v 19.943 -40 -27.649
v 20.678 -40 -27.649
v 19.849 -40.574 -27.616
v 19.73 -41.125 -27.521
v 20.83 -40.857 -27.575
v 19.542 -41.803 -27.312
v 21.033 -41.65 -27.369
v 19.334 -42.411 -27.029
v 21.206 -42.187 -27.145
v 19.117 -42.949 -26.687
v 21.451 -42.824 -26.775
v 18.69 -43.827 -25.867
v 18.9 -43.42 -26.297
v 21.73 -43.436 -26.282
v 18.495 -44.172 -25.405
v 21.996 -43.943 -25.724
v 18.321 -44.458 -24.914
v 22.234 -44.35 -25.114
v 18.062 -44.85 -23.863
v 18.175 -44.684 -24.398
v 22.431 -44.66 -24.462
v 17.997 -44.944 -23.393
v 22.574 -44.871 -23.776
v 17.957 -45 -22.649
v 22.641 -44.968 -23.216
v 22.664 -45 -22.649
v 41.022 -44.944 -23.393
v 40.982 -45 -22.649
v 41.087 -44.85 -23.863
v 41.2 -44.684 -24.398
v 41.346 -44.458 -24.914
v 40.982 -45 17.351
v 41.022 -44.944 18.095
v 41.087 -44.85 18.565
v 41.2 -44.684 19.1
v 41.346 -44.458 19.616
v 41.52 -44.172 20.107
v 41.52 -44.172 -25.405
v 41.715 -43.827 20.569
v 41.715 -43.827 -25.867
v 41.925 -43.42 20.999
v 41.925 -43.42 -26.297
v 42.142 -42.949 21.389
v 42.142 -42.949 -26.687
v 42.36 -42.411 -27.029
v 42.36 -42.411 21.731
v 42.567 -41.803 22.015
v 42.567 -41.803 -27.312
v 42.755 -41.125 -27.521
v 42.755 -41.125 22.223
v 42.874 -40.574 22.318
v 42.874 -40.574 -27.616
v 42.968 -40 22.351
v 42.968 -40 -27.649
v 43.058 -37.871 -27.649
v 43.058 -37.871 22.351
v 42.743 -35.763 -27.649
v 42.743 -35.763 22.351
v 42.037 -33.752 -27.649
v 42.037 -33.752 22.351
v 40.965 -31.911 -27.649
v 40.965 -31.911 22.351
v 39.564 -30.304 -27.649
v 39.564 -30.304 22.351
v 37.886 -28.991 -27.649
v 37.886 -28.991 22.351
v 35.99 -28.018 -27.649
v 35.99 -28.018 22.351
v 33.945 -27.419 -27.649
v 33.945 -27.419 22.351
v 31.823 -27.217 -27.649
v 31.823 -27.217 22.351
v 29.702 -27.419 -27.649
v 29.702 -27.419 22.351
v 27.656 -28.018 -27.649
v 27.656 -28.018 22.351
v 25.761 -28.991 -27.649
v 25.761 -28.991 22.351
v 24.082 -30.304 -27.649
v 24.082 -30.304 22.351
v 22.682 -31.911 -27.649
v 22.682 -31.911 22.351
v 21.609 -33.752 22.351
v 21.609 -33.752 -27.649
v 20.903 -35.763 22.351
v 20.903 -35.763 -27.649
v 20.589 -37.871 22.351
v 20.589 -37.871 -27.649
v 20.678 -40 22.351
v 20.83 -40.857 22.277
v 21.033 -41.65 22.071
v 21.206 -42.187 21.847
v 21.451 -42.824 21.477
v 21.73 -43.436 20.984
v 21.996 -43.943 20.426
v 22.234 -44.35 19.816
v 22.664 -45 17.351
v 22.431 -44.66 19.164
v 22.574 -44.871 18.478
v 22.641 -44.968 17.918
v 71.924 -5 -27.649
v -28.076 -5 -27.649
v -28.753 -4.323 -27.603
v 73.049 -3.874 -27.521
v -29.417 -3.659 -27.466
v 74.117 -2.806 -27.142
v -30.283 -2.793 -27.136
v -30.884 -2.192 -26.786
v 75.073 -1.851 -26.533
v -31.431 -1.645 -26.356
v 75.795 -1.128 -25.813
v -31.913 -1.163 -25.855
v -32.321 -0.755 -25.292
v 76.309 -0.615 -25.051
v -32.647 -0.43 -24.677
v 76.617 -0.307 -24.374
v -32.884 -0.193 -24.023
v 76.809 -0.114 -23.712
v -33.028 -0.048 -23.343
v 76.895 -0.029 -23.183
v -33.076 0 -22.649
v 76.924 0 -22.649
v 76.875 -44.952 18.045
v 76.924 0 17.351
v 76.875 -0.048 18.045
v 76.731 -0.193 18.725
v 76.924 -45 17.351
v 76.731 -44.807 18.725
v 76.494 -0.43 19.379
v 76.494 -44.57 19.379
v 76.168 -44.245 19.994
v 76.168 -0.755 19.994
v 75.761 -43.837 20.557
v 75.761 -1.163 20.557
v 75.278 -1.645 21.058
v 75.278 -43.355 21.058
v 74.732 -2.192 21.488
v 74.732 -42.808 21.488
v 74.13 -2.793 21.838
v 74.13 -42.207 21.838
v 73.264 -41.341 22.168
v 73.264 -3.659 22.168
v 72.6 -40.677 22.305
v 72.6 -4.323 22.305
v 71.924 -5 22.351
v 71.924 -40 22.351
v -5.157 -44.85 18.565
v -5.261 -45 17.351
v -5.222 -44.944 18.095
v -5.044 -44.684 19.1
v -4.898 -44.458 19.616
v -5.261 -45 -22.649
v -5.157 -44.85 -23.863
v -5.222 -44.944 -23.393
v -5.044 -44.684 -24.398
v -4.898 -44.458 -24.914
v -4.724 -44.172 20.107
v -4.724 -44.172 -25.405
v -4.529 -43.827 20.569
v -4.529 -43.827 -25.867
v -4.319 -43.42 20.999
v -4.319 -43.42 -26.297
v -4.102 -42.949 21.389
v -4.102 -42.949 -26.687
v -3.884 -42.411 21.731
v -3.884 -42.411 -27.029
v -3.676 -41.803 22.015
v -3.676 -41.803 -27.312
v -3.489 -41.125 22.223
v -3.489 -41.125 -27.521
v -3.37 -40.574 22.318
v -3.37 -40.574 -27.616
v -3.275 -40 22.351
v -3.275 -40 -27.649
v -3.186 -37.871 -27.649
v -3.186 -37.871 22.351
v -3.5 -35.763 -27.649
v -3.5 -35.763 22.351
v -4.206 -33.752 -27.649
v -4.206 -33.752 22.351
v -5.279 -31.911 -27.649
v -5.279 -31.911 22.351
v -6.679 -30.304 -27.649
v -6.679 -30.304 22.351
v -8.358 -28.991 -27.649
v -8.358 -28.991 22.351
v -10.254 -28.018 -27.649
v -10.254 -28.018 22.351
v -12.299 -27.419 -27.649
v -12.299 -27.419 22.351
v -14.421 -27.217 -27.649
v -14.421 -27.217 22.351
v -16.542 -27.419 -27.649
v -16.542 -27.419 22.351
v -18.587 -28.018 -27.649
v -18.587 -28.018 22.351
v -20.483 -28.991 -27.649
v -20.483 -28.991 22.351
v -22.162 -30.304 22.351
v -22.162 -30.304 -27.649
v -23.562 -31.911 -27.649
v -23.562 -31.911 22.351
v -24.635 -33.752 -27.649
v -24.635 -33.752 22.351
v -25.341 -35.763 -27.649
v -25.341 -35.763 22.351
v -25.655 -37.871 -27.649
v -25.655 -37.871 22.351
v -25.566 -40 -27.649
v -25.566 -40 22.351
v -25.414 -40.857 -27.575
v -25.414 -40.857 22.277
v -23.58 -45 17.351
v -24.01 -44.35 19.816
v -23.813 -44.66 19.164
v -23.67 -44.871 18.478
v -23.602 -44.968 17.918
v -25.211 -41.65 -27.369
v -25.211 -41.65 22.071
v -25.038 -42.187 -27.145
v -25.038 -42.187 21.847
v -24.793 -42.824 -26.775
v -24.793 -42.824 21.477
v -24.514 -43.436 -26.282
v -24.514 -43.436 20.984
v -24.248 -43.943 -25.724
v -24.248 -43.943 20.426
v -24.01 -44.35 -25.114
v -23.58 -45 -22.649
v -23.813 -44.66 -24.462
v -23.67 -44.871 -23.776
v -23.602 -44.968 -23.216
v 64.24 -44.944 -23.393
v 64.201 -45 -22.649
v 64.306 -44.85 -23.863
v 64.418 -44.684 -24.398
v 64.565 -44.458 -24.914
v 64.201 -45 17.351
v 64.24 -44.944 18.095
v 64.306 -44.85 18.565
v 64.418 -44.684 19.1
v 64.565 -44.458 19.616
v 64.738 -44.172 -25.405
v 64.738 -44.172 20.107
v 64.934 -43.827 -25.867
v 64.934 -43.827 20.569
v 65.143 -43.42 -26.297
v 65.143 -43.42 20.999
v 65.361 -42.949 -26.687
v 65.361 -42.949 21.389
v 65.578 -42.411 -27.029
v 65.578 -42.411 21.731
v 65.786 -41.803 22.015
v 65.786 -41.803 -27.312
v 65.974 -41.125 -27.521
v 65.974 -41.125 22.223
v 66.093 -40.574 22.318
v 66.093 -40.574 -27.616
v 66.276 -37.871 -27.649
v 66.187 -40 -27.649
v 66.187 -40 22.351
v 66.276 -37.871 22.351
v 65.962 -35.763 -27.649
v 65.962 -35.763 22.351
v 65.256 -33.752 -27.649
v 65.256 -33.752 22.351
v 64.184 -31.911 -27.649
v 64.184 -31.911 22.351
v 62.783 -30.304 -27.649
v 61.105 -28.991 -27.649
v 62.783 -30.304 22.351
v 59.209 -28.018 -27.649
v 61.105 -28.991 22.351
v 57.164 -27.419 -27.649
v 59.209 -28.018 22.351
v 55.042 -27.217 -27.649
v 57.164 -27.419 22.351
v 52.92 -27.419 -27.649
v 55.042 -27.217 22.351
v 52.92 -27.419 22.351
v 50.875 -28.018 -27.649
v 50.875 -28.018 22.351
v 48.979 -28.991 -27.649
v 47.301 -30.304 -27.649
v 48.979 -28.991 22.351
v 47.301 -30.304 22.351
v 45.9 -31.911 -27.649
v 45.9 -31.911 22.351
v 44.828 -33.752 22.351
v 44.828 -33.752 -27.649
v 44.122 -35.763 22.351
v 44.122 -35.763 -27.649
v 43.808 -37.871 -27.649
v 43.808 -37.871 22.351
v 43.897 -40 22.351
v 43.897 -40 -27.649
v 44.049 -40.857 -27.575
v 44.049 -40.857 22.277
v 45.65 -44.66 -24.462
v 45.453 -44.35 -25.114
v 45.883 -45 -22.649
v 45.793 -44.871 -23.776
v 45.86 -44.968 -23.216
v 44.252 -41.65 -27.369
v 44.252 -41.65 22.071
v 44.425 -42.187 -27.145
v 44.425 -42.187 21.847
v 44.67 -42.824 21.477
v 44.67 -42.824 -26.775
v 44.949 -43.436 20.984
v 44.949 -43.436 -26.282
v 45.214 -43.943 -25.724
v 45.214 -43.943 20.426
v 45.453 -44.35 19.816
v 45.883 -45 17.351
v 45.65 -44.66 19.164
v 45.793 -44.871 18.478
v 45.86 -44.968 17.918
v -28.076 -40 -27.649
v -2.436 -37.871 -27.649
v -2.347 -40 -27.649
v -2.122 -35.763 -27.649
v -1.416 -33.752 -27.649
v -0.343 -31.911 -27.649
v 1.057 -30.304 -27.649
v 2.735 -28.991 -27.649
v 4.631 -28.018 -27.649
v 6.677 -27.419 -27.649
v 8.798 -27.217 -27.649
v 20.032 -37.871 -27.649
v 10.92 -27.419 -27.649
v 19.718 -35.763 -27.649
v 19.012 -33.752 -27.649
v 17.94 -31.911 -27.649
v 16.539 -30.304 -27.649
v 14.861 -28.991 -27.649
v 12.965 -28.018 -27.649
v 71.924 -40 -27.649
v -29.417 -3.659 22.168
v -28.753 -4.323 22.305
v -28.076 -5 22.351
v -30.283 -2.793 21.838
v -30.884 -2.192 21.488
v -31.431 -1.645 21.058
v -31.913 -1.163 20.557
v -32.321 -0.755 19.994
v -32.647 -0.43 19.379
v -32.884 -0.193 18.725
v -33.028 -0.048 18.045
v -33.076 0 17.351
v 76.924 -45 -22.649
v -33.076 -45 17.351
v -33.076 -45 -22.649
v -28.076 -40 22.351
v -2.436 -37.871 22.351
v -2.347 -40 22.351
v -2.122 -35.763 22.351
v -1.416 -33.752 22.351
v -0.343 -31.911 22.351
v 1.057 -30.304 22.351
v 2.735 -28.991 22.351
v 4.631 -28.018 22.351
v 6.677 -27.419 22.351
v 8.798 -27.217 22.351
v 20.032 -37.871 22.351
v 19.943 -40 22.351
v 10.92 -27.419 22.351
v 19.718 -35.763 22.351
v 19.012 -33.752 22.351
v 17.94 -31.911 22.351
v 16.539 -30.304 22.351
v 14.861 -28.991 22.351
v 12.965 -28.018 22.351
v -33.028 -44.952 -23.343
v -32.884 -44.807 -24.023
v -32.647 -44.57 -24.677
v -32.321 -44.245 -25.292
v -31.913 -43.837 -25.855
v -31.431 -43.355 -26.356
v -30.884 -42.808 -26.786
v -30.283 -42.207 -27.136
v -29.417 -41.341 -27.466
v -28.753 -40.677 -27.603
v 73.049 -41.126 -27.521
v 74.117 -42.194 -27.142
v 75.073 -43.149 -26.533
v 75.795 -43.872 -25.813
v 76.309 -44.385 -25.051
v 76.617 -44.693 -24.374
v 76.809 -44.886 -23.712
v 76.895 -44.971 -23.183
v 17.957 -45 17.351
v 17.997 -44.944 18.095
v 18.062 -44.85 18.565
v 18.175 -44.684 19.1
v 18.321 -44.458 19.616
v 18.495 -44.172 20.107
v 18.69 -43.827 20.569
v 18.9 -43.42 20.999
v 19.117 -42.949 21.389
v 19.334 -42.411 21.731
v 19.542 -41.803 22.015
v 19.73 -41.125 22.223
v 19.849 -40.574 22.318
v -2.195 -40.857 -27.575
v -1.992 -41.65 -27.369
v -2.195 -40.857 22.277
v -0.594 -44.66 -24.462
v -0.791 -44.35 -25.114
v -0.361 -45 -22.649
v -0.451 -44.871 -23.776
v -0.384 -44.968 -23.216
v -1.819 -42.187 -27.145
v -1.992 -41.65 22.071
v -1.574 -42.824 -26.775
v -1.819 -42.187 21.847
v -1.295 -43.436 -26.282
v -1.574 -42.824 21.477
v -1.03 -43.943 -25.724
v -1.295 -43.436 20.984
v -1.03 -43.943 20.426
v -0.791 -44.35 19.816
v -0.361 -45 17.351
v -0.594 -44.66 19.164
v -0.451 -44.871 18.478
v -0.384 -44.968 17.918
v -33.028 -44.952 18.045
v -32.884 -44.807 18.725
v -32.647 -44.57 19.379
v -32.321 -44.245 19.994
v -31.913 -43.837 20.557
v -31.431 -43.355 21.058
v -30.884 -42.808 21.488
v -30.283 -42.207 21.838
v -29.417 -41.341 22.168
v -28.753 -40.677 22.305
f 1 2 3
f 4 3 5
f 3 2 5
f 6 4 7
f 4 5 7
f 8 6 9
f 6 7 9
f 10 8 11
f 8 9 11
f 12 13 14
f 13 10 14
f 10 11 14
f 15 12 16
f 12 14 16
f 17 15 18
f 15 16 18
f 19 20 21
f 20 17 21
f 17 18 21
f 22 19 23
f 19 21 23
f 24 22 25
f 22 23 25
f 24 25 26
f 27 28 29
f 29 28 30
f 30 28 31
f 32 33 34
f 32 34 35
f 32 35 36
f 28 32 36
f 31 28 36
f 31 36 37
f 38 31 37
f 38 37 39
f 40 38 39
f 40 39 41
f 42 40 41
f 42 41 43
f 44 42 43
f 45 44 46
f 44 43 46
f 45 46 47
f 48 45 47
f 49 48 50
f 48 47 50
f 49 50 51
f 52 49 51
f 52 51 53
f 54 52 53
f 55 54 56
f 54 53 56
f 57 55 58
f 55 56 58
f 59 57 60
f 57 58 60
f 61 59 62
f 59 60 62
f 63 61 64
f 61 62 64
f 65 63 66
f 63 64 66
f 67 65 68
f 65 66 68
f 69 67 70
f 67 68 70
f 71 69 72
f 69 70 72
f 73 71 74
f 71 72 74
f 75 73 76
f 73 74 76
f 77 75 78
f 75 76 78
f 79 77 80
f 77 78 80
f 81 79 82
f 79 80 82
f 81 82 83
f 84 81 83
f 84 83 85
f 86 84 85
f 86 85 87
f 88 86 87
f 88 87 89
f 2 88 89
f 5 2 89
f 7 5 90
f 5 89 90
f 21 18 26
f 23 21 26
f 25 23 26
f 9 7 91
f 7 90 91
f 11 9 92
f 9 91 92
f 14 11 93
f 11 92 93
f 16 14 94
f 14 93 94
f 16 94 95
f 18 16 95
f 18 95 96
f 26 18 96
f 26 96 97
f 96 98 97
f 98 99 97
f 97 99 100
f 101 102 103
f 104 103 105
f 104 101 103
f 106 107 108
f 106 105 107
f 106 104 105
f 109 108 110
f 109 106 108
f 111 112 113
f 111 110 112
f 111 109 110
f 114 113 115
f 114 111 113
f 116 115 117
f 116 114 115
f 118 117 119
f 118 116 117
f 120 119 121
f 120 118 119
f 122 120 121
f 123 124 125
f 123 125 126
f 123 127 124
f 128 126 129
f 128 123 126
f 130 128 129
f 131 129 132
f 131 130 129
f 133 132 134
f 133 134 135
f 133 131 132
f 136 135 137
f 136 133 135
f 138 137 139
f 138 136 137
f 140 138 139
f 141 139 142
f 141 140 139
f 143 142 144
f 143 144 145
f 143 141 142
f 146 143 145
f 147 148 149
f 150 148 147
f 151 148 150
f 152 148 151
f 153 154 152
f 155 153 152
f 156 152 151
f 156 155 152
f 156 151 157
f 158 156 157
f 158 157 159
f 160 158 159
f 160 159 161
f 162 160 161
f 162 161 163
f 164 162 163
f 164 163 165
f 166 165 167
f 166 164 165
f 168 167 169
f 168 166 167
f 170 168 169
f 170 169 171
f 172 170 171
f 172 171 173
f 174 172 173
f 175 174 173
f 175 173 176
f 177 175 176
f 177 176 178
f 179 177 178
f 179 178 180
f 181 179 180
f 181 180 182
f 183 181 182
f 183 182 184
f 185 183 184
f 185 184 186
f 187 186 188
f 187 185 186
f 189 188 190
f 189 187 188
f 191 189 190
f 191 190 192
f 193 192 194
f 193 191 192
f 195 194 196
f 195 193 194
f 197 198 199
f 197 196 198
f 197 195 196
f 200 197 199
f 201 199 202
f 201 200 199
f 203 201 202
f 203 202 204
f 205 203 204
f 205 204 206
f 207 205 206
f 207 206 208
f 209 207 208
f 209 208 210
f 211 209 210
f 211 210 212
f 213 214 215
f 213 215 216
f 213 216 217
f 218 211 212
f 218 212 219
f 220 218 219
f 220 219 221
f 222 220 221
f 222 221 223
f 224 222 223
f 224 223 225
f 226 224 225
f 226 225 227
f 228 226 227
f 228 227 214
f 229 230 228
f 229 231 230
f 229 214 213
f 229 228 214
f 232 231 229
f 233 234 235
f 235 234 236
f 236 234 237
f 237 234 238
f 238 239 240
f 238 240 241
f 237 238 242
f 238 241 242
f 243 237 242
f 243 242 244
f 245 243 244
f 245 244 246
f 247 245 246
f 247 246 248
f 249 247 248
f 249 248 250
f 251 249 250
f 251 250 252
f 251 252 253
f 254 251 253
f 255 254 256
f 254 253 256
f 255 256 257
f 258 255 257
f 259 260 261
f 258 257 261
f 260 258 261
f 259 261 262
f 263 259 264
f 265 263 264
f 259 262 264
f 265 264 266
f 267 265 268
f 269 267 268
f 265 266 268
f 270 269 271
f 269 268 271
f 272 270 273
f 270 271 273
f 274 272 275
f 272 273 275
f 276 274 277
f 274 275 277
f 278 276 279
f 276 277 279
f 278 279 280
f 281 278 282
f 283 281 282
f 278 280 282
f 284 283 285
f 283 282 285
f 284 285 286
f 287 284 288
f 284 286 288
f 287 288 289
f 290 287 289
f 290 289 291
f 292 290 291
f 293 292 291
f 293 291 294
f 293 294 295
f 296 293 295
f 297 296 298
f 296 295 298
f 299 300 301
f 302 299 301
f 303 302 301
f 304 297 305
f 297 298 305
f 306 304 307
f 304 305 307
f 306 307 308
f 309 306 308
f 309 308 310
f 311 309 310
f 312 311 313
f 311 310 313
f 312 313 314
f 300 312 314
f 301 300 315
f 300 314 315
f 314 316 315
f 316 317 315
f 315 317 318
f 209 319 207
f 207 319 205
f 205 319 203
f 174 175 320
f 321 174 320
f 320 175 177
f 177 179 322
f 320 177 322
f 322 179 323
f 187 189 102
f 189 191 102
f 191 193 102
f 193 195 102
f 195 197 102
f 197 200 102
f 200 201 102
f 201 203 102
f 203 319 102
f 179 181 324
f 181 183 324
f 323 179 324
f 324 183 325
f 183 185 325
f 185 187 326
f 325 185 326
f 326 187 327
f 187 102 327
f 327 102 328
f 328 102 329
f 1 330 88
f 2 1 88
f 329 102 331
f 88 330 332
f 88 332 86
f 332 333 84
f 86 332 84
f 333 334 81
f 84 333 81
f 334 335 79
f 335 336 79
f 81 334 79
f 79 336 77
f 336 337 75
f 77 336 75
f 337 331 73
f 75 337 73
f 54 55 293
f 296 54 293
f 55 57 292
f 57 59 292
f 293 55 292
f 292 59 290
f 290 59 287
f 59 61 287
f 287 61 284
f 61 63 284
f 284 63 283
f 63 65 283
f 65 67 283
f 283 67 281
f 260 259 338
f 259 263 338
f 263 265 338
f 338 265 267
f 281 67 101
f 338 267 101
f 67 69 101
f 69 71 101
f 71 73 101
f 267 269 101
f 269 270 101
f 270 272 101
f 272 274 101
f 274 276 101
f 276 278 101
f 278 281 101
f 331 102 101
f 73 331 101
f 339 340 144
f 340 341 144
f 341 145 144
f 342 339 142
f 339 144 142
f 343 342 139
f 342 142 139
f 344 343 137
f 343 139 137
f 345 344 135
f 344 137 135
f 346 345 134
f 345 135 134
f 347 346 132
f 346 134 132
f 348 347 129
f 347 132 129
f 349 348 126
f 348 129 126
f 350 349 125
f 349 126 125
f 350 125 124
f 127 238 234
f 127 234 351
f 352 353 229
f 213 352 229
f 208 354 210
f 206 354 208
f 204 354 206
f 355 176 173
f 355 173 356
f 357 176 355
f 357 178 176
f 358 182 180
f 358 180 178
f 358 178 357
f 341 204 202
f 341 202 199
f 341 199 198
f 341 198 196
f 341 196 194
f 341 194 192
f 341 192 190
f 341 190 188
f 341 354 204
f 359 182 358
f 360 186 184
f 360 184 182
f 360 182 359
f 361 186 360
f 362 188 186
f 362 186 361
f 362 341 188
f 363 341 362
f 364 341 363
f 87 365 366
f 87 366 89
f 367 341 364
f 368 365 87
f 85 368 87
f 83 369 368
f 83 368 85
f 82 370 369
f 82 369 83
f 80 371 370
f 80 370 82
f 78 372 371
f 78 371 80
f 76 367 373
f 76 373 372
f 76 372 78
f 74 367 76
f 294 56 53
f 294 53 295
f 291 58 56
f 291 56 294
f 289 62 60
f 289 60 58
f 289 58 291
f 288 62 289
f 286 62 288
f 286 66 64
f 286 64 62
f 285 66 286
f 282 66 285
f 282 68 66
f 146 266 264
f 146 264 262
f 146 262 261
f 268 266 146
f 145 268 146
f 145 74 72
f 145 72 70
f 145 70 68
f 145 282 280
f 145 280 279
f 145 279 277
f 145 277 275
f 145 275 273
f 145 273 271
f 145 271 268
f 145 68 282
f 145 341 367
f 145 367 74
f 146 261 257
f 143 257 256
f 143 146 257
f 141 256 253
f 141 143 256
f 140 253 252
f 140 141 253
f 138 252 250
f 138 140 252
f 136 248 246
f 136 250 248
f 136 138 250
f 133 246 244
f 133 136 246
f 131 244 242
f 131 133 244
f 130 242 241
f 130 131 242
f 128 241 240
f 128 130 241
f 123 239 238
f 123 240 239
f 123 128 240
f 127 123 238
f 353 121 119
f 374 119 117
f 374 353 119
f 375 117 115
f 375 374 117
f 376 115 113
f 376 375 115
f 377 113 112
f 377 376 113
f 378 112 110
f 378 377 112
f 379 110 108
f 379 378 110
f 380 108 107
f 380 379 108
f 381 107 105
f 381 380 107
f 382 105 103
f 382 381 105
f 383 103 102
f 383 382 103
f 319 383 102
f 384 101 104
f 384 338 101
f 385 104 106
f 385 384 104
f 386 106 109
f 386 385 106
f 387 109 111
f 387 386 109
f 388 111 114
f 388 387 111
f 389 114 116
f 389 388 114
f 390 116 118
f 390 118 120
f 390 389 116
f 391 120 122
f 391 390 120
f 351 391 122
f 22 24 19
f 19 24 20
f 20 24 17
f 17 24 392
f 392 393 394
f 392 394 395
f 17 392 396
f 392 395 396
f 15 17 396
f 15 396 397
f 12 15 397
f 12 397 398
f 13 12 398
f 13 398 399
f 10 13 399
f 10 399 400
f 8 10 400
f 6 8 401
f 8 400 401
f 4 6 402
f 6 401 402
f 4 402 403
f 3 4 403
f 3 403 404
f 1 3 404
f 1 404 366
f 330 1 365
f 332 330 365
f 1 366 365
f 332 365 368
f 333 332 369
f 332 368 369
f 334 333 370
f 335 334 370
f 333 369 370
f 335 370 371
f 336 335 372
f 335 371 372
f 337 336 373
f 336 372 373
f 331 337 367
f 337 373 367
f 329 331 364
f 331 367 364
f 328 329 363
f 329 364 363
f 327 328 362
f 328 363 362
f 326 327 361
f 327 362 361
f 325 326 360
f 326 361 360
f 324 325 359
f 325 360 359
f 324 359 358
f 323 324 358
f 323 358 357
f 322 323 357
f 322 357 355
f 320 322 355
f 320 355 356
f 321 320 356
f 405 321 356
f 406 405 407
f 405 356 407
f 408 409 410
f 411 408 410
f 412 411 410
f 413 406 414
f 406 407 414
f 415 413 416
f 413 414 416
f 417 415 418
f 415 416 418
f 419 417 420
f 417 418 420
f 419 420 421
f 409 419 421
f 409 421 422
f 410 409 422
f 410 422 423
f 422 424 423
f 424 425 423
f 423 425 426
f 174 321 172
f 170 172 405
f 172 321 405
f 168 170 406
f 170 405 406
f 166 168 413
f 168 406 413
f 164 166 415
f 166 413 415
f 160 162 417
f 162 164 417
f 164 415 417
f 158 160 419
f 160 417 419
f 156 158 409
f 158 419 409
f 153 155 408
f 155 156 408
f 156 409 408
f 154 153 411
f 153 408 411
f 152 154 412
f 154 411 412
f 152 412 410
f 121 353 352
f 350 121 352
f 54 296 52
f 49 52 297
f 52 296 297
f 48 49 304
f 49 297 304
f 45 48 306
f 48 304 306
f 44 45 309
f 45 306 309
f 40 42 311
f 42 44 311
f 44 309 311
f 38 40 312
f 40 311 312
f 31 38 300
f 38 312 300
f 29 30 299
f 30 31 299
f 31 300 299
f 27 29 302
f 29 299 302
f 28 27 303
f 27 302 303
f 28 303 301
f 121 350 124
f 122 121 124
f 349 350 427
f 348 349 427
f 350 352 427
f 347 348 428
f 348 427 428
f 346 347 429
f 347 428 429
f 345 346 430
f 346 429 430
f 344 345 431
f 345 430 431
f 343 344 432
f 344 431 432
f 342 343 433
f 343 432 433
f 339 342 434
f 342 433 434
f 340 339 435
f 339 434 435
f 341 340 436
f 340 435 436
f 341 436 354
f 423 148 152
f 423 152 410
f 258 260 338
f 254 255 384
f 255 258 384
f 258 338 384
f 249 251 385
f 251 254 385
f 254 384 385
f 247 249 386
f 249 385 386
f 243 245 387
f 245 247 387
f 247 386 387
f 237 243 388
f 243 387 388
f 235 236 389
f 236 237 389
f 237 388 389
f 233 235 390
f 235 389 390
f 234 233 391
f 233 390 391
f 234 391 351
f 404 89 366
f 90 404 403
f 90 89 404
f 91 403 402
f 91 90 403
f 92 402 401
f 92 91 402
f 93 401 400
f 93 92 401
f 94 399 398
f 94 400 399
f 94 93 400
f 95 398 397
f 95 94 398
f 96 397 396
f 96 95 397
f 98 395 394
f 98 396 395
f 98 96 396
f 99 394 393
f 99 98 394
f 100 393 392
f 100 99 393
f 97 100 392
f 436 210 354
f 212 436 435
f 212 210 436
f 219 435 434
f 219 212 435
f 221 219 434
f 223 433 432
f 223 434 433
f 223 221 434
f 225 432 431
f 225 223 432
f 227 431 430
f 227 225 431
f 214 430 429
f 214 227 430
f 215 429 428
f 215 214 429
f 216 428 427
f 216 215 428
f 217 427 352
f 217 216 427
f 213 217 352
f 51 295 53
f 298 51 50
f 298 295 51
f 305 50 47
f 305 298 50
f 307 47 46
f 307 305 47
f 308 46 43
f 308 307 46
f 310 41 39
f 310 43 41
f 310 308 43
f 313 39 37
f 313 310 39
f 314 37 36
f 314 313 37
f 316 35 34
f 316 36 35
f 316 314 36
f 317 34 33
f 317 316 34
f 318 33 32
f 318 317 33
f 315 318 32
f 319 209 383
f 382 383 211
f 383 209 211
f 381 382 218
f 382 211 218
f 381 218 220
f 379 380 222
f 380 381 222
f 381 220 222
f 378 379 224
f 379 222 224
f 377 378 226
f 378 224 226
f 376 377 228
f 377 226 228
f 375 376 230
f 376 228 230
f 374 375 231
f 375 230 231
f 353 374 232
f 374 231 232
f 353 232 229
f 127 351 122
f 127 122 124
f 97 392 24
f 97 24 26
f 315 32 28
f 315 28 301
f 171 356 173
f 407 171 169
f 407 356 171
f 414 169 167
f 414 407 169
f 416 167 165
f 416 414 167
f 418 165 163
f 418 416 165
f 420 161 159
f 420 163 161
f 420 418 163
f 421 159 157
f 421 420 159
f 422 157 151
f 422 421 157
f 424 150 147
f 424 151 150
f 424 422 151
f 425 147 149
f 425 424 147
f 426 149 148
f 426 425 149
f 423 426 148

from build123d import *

# Parameters (mm, degrees)
F0_W     = 110
F0_H     = 50
F1_DEPTH = 45
F2_R     = 5
F3_R     = 11.25
F4_DEPTH = 50
F5_DEPTH = 25


with BuildPart() as f1:
    # F0 (on Front) → F1 (new body)
    with BuildSketch(Plane.XZ):
        with Locations((21.923708, -2.648987)):
            Rectangle(F0_W, F0_H)
    extrude(amount=F1_DEPTH)

    # F2
    f2_edges = [f1.edges().sort_by_distance(p)[0] for p in [
        (76.923708, -22.5, 22.351013),
        (-33.076292, -22.5, 22.351013),
        (21.923708, 0, 22.351013),
        (21.923708, -45, 22.351013),
        (-33.076292, -22.5, -27.648987),
        (76.923708, -22.5, -27.648987),
        (21.923708, 0, -27.648987),
        (21.923708, -45, -27.648987),
    ]]
    fillet(f2_edges, radius=F2_R)

    # F3 (on Top) → F4 (cut)
    with BuildSketch(Plane.XY):
        with Locations((-14.420521, -38.467415)):
            Circle(F3_R)
        with Locations((8.798155, -38.467415)):
            Circle(F3_R)
        with Locations((31.823341, -38.467415)):
            Circle(F3_R)
        with Locations((55.042014, -38.467415)):
            Circle(F3_R)
    extrude(amount=-F4_DEPTH, mode=Mode.SUBTRACT)

    # F3 (on Top) → F5 (cut)
    with BuildSketch(Plane.XY):
        with Locations((-14.420521, -38.467415)):
            Circle(F3_R)
        with Locations((8.798155, -38.467415)):
            Circle(F3_R)
        with Locations((31.823341, -38.467415)):
            Circle(F3_R)
        with Locations((55.042014, -38.467415)):
            Circle(F3_R)
    extrude(amount=F5_DEPTH, mode=Mode.SUBTRACT)


solid = f1.part
